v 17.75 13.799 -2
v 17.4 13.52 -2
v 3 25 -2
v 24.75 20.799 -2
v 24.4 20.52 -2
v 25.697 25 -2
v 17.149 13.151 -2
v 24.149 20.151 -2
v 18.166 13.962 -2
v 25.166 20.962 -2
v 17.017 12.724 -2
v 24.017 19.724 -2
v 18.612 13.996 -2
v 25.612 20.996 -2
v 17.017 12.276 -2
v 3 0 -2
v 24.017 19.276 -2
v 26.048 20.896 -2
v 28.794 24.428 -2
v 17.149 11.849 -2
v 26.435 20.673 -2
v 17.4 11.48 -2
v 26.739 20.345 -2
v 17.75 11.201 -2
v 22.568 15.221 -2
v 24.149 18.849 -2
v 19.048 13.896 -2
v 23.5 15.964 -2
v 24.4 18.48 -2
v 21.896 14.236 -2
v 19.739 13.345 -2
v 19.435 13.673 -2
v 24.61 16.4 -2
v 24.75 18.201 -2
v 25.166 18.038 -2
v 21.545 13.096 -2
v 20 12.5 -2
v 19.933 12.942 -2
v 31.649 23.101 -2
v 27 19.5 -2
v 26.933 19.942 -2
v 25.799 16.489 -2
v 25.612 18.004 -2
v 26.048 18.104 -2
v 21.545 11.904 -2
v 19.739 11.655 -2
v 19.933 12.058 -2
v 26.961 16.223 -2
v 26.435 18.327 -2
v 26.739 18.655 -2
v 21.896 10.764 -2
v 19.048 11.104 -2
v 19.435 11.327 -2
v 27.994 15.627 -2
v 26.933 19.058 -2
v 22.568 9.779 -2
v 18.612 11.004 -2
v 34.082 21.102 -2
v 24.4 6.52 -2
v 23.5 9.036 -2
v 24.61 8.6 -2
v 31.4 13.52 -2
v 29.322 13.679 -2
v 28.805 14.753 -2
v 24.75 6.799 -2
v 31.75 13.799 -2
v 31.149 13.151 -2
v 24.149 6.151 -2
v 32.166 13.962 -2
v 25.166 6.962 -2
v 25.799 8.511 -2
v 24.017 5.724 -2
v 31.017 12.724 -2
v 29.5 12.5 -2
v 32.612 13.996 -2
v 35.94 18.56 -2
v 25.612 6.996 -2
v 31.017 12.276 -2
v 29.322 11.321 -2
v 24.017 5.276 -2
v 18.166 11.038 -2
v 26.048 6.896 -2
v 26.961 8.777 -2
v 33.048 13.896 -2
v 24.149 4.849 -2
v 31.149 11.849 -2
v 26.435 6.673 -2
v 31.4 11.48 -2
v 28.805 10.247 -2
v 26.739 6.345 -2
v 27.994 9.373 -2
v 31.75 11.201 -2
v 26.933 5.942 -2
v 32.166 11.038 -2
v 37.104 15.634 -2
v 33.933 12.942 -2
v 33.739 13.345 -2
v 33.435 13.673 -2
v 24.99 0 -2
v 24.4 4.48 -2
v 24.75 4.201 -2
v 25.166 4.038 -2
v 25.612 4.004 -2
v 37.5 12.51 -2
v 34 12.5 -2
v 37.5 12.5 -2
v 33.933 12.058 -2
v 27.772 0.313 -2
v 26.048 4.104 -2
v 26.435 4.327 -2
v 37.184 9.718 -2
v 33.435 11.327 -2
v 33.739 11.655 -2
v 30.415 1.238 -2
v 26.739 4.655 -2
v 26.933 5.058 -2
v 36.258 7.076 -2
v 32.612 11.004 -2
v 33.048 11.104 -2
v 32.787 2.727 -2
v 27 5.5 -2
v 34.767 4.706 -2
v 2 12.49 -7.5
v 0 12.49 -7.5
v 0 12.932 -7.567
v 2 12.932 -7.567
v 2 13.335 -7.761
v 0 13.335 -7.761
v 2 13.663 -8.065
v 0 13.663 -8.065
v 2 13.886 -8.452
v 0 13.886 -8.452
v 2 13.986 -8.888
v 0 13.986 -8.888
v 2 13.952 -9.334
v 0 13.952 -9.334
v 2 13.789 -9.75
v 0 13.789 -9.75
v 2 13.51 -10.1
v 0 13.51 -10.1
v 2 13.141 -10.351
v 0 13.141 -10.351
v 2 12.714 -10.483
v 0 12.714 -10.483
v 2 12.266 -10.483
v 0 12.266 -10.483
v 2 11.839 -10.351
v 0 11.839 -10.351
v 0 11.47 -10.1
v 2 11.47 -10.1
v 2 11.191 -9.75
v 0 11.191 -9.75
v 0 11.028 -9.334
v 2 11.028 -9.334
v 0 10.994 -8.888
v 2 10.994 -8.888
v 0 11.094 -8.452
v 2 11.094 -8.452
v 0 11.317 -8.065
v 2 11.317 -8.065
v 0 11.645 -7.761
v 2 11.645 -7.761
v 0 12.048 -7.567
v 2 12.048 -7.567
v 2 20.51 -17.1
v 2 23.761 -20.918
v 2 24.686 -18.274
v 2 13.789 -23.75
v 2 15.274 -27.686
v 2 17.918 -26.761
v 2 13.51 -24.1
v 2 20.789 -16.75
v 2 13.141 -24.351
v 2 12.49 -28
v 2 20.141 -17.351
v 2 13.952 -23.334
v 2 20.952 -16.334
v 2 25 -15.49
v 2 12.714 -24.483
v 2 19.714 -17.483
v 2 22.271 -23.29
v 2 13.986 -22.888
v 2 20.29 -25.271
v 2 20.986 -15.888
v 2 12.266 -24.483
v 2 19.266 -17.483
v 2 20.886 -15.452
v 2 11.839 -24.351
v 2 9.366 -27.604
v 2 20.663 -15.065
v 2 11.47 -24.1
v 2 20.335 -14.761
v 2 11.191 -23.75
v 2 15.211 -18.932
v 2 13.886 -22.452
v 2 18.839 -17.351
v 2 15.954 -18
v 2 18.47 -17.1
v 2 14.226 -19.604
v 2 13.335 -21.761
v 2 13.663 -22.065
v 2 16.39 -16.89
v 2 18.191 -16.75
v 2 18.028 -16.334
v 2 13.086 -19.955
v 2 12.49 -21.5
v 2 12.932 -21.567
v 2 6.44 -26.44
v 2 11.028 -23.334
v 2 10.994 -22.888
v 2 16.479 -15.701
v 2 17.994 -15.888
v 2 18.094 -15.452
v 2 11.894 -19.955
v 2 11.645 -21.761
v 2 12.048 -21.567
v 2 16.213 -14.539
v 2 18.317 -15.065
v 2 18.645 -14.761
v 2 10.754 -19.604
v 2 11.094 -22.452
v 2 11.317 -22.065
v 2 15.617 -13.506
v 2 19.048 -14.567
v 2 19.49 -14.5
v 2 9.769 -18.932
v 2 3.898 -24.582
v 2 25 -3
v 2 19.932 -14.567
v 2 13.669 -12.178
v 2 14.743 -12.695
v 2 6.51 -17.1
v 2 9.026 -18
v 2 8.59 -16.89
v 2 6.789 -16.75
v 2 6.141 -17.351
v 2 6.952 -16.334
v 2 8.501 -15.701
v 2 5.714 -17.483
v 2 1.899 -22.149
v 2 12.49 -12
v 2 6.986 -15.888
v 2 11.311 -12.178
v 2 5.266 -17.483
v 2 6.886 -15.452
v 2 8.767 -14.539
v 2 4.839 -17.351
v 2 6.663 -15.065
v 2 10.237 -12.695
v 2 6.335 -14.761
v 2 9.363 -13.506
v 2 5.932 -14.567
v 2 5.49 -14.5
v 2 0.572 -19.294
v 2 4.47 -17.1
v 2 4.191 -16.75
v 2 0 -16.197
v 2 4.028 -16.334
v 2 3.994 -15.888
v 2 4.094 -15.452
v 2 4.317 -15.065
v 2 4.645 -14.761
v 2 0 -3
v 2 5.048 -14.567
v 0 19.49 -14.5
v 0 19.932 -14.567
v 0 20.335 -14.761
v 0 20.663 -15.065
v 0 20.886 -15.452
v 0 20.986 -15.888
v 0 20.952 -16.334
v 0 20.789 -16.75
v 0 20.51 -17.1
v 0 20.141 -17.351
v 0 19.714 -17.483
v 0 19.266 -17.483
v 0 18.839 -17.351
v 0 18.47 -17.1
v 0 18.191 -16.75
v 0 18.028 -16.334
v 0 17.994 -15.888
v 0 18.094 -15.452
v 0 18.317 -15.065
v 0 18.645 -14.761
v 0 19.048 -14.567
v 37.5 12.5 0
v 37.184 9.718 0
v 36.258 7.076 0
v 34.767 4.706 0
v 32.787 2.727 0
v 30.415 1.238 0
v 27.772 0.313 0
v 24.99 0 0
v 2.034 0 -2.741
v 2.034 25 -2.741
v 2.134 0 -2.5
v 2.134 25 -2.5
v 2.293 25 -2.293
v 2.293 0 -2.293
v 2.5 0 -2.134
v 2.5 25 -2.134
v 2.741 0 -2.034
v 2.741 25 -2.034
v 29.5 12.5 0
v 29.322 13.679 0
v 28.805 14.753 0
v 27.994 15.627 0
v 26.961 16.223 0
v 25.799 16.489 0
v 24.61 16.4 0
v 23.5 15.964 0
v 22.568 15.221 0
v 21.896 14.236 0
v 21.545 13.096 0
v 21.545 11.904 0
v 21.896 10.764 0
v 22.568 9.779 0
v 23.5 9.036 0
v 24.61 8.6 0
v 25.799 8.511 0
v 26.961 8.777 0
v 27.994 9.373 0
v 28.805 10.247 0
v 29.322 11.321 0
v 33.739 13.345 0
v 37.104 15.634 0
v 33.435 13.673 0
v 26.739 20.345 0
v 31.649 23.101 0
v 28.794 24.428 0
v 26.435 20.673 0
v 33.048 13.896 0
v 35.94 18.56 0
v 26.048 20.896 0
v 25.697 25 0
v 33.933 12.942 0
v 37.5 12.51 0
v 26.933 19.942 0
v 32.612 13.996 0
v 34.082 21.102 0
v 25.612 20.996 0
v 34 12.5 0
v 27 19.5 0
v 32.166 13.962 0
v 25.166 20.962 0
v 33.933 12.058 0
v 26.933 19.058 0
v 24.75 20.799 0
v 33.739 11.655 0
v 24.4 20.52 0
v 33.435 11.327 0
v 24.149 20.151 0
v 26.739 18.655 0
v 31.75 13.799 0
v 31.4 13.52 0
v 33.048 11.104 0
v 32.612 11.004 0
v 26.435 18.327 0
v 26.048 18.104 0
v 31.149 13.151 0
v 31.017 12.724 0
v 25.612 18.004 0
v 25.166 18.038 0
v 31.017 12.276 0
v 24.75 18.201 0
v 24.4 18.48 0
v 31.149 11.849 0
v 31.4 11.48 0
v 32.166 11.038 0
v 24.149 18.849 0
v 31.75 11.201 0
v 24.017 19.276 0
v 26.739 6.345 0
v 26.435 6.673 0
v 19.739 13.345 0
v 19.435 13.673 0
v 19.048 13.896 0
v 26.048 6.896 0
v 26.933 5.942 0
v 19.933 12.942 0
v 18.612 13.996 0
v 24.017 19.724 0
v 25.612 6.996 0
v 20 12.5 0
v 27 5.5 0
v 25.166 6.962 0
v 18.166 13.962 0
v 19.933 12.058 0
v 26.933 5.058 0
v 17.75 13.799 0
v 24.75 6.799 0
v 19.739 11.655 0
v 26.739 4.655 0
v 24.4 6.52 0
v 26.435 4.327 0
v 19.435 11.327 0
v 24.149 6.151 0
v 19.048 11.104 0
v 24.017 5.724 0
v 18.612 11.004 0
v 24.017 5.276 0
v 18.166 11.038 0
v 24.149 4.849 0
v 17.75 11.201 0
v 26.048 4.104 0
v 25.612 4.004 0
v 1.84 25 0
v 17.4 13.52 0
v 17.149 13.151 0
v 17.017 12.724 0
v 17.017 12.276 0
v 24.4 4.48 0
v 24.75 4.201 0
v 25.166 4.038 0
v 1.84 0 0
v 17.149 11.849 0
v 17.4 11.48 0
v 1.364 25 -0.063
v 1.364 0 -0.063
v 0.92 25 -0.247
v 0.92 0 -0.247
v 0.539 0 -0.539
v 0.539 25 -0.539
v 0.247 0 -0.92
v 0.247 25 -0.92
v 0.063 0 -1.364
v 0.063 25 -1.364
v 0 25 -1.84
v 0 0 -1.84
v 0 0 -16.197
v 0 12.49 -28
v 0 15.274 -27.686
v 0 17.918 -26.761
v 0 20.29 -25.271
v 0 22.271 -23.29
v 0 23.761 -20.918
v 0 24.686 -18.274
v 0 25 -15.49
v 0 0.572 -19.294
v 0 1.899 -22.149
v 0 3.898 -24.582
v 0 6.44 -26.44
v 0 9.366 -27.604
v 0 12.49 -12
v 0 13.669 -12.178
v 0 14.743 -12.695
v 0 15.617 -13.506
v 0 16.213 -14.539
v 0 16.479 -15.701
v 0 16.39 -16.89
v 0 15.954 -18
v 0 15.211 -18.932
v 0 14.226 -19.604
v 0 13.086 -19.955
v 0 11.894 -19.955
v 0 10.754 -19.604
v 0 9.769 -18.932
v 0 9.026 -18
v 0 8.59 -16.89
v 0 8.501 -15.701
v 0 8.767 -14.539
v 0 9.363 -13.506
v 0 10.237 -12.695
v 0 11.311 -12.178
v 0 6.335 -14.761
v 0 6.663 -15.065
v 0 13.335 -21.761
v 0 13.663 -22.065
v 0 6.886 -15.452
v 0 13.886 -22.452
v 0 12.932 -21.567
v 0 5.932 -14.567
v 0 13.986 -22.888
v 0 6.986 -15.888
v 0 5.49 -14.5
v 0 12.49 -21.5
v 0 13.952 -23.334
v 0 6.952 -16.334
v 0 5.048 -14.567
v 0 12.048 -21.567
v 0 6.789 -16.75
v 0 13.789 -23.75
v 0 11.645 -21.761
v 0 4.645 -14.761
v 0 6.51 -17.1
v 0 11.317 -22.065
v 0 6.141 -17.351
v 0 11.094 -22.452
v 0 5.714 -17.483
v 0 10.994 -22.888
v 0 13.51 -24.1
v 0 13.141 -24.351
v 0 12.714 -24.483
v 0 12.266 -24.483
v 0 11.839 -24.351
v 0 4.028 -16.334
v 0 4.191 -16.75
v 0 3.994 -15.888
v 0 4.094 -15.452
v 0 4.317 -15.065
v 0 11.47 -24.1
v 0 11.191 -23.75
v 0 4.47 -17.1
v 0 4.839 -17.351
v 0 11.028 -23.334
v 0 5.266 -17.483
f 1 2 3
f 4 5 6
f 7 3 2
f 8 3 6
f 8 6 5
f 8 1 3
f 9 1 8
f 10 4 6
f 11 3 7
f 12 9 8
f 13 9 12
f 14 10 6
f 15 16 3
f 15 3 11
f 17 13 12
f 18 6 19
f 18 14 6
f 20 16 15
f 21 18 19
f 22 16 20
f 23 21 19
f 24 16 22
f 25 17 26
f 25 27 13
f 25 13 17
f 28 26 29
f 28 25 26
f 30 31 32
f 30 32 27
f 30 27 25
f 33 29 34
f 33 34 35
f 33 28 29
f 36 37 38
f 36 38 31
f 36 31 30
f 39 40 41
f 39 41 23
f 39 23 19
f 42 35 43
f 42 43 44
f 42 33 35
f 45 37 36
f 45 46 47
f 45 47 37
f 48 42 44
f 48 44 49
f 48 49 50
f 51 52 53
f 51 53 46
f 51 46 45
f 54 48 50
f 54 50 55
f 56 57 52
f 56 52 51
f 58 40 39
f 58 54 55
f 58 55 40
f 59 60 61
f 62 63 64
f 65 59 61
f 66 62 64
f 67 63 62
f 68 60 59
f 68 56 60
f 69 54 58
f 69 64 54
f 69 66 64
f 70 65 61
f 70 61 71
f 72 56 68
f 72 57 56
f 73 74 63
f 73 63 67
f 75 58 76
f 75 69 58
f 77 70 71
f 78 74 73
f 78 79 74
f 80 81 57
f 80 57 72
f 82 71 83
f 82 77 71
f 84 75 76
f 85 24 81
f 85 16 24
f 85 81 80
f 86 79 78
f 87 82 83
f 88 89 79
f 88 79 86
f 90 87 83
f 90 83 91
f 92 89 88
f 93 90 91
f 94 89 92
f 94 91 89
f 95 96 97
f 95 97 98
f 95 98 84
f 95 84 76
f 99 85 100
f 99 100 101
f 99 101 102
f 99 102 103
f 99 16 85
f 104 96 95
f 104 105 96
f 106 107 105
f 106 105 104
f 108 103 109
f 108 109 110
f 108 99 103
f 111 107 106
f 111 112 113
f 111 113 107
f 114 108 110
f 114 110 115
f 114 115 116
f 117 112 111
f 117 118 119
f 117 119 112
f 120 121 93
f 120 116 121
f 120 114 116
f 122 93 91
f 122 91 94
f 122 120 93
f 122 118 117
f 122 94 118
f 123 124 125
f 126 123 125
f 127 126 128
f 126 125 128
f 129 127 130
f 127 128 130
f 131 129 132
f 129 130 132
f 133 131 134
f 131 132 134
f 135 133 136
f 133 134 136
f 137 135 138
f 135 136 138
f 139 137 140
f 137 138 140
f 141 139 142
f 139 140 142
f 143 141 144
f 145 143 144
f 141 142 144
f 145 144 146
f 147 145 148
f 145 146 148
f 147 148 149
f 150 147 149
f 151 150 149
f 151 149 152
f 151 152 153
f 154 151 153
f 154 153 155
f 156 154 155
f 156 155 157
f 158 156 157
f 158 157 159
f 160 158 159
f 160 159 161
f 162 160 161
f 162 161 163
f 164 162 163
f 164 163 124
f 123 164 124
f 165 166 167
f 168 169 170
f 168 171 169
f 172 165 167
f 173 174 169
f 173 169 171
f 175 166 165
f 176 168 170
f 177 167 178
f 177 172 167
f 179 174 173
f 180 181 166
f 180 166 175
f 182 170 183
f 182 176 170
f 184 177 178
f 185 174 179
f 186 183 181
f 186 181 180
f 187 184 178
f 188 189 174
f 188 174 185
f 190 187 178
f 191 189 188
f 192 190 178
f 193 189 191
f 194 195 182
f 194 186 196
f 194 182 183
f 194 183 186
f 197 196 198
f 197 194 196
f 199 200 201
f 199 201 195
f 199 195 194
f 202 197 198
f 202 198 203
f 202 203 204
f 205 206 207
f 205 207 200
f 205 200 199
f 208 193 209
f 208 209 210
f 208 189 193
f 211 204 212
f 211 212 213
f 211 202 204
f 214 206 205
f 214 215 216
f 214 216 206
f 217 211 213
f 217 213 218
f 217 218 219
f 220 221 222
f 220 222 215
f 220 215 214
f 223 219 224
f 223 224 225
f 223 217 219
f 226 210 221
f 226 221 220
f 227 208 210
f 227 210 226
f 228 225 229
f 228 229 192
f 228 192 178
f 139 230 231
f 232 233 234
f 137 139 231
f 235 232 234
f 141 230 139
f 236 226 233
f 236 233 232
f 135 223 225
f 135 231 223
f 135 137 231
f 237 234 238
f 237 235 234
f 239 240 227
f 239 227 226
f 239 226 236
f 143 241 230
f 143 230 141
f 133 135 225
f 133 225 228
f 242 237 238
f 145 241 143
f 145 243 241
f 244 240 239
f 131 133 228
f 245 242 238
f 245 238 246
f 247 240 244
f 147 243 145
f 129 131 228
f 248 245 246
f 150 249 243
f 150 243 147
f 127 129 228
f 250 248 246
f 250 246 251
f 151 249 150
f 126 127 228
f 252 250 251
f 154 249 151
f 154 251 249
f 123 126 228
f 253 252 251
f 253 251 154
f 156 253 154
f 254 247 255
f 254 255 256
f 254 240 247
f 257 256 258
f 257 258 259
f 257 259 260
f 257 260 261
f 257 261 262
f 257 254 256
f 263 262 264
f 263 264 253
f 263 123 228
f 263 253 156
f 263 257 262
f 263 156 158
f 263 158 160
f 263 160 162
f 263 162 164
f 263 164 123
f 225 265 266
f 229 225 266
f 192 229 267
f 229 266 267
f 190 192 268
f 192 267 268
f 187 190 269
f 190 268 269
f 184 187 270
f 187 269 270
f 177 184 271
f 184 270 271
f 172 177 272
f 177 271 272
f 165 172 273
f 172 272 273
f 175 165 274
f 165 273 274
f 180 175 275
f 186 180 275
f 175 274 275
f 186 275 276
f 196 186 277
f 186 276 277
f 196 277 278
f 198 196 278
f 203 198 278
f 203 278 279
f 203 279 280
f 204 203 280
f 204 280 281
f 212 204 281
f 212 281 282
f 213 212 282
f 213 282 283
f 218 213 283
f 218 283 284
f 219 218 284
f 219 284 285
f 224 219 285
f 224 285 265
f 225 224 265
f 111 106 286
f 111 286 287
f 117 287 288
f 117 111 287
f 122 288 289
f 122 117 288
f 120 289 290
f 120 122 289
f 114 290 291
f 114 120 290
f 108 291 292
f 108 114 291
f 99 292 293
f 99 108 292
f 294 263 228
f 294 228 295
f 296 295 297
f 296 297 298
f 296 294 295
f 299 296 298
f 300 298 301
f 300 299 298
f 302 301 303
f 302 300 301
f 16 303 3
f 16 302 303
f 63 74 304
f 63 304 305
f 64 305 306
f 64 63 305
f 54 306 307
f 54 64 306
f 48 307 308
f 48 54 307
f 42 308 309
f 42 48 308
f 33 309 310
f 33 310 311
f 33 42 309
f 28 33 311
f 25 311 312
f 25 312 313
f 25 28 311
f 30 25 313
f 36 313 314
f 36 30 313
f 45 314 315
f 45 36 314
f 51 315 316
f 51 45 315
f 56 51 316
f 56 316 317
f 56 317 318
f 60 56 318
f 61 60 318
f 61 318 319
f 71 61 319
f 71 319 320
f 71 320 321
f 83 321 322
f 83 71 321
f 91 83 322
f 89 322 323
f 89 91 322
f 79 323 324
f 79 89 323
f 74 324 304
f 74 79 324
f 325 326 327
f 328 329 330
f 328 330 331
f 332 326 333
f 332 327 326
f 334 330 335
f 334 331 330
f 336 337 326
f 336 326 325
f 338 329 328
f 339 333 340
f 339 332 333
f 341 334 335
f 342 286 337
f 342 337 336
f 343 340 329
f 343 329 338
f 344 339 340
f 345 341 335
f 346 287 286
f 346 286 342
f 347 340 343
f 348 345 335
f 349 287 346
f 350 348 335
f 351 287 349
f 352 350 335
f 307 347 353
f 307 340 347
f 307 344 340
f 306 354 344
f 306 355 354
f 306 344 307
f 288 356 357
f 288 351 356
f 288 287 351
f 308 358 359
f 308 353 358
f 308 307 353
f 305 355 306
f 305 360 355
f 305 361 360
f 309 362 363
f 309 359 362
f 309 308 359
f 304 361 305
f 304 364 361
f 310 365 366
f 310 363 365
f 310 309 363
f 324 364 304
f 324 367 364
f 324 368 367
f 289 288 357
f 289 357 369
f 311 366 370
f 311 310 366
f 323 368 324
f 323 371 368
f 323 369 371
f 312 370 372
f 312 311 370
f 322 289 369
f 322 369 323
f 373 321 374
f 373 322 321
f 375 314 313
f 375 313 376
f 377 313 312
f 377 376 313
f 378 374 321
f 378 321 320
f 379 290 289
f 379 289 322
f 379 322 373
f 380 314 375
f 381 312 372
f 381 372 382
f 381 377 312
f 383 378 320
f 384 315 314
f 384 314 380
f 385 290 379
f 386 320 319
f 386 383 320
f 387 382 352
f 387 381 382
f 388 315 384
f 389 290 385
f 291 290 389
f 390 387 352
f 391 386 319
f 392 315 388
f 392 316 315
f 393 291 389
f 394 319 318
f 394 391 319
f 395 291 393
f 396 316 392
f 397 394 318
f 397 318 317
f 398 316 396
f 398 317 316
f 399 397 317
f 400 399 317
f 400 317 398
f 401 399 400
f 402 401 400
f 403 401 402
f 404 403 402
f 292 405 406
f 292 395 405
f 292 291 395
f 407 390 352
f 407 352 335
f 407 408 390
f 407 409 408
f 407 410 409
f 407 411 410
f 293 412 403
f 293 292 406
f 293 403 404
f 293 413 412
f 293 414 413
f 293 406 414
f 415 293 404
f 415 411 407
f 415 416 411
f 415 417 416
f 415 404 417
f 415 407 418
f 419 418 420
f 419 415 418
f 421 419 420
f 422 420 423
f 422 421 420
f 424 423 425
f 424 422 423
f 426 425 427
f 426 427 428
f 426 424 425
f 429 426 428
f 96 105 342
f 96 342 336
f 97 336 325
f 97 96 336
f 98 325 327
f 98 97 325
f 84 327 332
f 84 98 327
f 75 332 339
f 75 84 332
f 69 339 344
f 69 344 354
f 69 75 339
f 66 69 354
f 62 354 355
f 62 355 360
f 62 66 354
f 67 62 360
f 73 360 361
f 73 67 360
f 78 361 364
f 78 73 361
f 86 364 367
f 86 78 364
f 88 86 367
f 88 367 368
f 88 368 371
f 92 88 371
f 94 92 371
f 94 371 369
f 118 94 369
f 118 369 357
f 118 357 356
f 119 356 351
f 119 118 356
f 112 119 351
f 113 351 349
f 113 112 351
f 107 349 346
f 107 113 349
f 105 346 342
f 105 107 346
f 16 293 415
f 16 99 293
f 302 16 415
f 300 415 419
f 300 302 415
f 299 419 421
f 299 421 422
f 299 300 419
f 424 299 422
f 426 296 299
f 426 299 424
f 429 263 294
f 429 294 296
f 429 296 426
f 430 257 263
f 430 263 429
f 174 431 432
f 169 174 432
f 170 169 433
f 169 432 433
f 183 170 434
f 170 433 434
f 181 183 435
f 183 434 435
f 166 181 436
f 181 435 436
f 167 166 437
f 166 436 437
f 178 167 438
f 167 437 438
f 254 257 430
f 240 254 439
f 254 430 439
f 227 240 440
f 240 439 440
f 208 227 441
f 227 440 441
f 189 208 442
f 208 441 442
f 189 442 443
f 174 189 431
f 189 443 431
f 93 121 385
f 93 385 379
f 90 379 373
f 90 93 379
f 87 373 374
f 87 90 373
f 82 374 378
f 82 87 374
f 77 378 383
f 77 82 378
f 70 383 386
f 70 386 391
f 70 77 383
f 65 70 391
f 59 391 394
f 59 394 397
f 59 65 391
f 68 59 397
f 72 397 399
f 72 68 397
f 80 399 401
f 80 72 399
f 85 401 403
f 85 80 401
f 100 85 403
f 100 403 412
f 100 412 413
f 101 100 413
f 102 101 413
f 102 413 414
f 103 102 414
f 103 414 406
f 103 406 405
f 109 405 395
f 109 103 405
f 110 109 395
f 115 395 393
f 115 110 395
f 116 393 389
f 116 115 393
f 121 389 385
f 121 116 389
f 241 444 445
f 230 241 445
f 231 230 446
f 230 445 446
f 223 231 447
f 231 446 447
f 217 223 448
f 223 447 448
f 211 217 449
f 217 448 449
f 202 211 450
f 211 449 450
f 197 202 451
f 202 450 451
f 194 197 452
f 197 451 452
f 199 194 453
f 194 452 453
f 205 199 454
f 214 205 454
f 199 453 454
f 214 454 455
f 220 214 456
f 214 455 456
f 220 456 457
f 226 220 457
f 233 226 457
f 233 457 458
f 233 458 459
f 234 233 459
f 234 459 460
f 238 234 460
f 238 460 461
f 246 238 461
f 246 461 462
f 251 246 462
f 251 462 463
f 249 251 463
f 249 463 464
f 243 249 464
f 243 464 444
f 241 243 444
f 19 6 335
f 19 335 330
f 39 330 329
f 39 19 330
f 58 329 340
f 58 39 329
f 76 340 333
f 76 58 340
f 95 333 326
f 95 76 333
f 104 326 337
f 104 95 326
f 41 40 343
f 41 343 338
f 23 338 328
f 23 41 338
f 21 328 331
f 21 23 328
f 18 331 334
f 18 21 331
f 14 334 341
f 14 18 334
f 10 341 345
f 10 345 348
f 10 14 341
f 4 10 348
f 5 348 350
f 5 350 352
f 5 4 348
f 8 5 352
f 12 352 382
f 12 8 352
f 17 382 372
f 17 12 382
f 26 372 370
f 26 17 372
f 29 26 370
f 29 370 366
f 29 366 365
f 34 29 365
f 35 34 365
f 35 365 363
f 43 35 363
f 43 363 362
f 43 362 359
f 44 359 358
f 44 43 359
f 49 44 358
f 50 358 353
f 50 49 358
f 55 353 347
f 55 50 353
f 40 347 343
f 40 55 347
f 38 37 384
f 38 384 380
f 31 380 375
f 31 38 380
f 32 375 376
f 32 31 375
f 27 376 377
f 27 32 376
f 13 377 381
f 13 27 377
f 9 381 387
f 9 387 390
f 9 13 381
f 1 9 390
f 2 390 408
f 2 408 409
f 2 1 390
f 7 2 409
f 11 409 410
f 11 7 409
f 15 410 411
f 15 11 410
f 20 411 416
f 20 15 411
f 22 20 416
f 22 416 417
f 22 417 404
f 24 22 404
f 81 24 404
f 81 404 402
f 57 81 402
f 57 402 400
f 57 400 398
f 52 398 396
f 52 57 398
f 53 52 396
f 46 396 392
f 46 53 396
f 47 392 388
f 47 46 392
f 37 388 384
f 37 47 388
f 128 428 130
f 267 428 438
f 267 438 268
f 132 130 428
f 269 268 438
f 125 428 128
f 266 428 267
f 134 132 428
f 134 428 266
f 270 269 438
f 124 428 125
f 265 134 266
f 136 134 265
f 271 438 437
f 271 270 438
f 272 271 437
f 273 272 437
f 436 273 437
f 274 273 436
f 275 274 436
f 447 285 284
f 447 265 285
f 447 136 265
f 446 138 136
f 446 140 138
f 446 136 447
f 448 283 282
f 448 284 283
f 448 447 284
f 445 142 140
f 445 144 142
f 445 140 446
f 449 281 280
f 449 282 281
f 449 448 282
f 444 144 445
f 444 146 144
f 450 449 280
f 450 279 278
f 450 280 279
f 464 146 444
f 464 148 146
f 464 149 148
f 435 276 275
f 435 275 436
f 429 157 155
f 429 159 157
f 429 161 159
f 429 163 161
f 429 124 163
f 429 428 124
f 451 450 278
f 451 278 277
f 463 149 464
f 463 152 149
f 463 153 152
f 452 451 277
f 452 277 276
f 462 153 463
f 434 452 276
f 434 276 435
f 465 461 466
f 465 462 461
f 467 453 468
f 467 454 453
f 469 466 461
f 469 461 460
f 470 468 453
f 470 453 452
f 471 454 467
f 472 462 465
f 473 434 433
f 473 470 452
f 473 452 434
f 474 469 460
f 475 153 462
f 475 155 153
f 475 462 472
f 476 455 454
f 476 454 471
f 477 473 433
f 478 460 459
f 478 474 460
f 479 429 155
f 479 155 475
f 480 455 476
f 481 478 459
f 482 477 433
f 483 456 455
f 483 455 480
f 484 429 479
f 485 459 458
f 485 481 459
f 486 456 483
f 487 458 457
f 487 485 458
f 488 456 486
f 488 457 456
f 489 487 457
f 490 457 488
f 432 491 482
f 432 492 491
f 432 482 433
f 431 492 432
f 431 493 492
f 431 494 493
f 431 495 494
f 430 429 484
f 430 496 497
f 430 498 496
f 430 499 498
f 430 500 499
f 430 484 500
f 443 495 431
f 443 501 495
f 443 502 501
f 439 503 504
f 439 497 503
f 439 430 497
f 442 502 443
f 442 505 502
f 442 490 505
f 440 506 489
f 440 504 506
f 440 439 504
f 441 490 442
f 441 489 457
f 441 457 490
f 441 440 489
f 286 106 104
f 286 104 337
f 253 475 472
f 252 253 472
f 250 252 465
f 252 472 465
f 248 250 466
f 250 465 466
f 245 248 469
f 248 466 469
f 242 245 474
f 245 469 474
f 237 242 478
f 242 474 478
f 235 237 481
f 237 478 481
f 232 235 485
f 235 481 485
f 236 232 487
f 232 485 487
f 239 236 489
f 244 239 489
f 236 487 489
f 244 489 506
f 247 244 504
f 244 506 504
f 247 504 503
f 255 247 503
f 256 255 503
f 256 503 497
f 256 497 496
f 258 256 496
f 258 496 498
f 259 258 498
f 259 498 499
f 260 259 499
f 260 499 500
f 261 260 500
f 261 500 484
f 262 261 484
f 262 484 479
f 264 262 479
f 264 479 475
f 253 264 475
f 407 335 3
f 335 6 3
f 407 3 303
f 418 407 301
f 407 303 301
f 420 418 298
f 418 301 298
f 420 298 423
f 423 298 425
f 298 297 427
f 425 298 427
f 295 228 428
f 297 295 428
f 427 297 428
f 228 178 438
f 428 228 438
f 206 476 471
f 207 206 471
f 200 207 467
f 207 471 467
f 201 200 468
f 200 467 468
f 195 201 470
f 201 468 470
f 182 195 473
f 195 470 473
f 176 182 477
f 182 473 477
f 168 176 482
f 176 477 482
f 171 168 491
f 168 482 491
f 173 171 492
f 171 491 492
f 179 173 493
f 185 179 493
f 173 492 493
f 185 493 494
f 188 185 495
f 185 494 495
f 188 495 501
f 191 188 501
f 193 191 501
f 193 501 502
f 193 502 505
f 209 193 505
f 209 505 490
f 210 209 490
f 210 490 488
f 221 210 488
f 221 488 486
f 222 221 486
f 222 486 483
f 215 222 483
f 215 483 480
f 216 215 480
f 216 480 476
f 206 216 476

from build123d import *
from OCP.BRepAlgoAPI import BRepAlgoAPI_Cut
from OCP.TopTools import TopTools_ListOfShape

# Parameters (mm, degrees)
SALIENTE_EXTRUIR1_DEPTH     = 25
CROQUIS2_R                  = 4
CROQUIS2_R_2                = 1.5
CORTAR_EXTRUIR1_DEPTH       = 25
CORTAR_EXTRUIR2_START       = -2
CORTAR_EXTRUIR2_OUTLINE_R   = 1.5
CORTAR_EXTRUIR2_OUTLINE_R_2 = 4
CORTAR_EXTRUIR2_DEPTH       = 2


with BuildPart() as part:
    # Croquis1 → Saliente-Extruir1 (new body)
    with BuildSketch(Plane(origin=(0, 0, 0), x_dir=(1, 0, 0), z_dir=(0, 1, 0))):
        with BuildLine():
            Line((0, 1.84), (0, 28))
            Line((0, 28), (2, 28))
            Line((2, 28), (2, 3))
            ThreePointArc((2, 3), (2.292893219, 2.292893219), (3, 2))
            Line((3, 2), (37.5, 2))
            Line((37.5, 2), (37.5, 0))
            Line((37.5, 0), (1.84, 0))
            ThreePointArc((1.84, 0), (0.538923523, 0.538923523), (0, 1.84))
        make_face()
    extrude(amount=SALIENTE_EXTRUIR1_DEPTH)

    # Croquis2 → Cortar-Extruir1 (cut)
    with BuildSketch(Plane.ZY):
        with Locations((-16, 12.49)):
            Circle(CROQUIS2_R)
        with Locations((-23, 12.49)):
            Circle(CROQUIS2_R_2)
        with BuildLine():
            ThreePointArc((-16.197106781, 0), (-24.582469572, 3.897730388), (-28, 12.49))
            Line((-28, 12.49), (-28, 0))
            Line((-28, 0), (-16.197106781, 0))
        make_face()
        with BuildLine():
            Line((-28, 25), (-28, 12.49))
            ThreePointArc((-28, 12.49), (-24.335905833, 21.335905833), (-15.49, 25))
            Line((-15.49, 25), (-28, 25))
        make_face()
        with Locations((-9, 12.49)):
            Circle(CROQUIS2_R_2)
        with Locations((-16, 19.49)):
            Circle(CROQUIS2_R_2)
        with Locations((-16, 5.49)):
            Circle(CROQUIS2_R_2)
    extrude(amount=-CORTAR_EXTRUIR1_DEPTH, mode=Mode.SUBTRACT)


with BuildPart() as cortar_extruir2_tool:
    # Cortar-Extruir2: read off the stored shape, not the designer's step
    # Cortar-Extruir2 outline → Cortar-Extruir2 (new body)
    with BuildSketch(Plane.XY.offset(CORTAR_EXTRUIR2_START)):
        with BuildLine():
            ThreePointArc((25.697106781, 25), (34.082469572, 21.102269612), (37.5, 12.51))
            Line((37.5, 12.51), (37.5, 25))
            Line((37.5, 25), (25.697106781, 25))
        make_face()
        with BuildLine():
            Line((37.5, 0), (37.499996003, 12.500000002))
            ThreePointArc((37.499996003, 12.500000002), (33.832369592, 3.66055934), (24.99, 0))
            Line((24.99, 0), (37.5, 0))
        make_face()
        with Locations((18.5, 12.5)):
            Circle(CORTAR_EXTRUIR2_OUTLINE_R)
        with Locations((25.5, 19.5)):
            Circle(CORTAR_EXTRUIR2_OUTLINE_R)
        with Locations((25.5, 5.5)):
            Circle(CORTAR_EXTRUIR2_OUTLINE_R)
        with Locations((25.5, 12.5)):
            Circle(CORTAR_EXTRUIR2_OUTLINE_R_2)
        with Locations((32.5, 12.5)):
            Circle(CORTAR_EXTRUIR2_OUTLINE_R)
    extrude(amount=CORTAR_EXTRUIR2_DEPTH)


with BuildPart() as part_1:
    add(part.part)

    # Cortar-Extruir2: cut by cortar_extruir2_tool, with a tolerance
    cortar_extruir2_stock = TopTools_ListOfShape()
    cortar_extruir2_stock.Append(part_1.part.wrapped)
    cortar_extruir2_tools = TopTools_ListOfShape()
    cortar_extruir2_tools.Append(cortar_extruir2_tool.part.wrapped)
    cortar_extruir2_cut = BRepAlgoAPI_Cut()
    cortar_extruir2_cut.SetArguments(cortar_extruir2_stock)
    cortar_extruir2_cut.SetTools(cortar_extruir2_tools)
    cortar_extruir2_cut.SetFuzzyValue(0.00001)
    cortar_extruir2_cut.Build()
    add(Compound.cast(cortar_extruir2_cut.Shape()).solids(), mode=Mode.REPLACE)


solid = part_1.part
